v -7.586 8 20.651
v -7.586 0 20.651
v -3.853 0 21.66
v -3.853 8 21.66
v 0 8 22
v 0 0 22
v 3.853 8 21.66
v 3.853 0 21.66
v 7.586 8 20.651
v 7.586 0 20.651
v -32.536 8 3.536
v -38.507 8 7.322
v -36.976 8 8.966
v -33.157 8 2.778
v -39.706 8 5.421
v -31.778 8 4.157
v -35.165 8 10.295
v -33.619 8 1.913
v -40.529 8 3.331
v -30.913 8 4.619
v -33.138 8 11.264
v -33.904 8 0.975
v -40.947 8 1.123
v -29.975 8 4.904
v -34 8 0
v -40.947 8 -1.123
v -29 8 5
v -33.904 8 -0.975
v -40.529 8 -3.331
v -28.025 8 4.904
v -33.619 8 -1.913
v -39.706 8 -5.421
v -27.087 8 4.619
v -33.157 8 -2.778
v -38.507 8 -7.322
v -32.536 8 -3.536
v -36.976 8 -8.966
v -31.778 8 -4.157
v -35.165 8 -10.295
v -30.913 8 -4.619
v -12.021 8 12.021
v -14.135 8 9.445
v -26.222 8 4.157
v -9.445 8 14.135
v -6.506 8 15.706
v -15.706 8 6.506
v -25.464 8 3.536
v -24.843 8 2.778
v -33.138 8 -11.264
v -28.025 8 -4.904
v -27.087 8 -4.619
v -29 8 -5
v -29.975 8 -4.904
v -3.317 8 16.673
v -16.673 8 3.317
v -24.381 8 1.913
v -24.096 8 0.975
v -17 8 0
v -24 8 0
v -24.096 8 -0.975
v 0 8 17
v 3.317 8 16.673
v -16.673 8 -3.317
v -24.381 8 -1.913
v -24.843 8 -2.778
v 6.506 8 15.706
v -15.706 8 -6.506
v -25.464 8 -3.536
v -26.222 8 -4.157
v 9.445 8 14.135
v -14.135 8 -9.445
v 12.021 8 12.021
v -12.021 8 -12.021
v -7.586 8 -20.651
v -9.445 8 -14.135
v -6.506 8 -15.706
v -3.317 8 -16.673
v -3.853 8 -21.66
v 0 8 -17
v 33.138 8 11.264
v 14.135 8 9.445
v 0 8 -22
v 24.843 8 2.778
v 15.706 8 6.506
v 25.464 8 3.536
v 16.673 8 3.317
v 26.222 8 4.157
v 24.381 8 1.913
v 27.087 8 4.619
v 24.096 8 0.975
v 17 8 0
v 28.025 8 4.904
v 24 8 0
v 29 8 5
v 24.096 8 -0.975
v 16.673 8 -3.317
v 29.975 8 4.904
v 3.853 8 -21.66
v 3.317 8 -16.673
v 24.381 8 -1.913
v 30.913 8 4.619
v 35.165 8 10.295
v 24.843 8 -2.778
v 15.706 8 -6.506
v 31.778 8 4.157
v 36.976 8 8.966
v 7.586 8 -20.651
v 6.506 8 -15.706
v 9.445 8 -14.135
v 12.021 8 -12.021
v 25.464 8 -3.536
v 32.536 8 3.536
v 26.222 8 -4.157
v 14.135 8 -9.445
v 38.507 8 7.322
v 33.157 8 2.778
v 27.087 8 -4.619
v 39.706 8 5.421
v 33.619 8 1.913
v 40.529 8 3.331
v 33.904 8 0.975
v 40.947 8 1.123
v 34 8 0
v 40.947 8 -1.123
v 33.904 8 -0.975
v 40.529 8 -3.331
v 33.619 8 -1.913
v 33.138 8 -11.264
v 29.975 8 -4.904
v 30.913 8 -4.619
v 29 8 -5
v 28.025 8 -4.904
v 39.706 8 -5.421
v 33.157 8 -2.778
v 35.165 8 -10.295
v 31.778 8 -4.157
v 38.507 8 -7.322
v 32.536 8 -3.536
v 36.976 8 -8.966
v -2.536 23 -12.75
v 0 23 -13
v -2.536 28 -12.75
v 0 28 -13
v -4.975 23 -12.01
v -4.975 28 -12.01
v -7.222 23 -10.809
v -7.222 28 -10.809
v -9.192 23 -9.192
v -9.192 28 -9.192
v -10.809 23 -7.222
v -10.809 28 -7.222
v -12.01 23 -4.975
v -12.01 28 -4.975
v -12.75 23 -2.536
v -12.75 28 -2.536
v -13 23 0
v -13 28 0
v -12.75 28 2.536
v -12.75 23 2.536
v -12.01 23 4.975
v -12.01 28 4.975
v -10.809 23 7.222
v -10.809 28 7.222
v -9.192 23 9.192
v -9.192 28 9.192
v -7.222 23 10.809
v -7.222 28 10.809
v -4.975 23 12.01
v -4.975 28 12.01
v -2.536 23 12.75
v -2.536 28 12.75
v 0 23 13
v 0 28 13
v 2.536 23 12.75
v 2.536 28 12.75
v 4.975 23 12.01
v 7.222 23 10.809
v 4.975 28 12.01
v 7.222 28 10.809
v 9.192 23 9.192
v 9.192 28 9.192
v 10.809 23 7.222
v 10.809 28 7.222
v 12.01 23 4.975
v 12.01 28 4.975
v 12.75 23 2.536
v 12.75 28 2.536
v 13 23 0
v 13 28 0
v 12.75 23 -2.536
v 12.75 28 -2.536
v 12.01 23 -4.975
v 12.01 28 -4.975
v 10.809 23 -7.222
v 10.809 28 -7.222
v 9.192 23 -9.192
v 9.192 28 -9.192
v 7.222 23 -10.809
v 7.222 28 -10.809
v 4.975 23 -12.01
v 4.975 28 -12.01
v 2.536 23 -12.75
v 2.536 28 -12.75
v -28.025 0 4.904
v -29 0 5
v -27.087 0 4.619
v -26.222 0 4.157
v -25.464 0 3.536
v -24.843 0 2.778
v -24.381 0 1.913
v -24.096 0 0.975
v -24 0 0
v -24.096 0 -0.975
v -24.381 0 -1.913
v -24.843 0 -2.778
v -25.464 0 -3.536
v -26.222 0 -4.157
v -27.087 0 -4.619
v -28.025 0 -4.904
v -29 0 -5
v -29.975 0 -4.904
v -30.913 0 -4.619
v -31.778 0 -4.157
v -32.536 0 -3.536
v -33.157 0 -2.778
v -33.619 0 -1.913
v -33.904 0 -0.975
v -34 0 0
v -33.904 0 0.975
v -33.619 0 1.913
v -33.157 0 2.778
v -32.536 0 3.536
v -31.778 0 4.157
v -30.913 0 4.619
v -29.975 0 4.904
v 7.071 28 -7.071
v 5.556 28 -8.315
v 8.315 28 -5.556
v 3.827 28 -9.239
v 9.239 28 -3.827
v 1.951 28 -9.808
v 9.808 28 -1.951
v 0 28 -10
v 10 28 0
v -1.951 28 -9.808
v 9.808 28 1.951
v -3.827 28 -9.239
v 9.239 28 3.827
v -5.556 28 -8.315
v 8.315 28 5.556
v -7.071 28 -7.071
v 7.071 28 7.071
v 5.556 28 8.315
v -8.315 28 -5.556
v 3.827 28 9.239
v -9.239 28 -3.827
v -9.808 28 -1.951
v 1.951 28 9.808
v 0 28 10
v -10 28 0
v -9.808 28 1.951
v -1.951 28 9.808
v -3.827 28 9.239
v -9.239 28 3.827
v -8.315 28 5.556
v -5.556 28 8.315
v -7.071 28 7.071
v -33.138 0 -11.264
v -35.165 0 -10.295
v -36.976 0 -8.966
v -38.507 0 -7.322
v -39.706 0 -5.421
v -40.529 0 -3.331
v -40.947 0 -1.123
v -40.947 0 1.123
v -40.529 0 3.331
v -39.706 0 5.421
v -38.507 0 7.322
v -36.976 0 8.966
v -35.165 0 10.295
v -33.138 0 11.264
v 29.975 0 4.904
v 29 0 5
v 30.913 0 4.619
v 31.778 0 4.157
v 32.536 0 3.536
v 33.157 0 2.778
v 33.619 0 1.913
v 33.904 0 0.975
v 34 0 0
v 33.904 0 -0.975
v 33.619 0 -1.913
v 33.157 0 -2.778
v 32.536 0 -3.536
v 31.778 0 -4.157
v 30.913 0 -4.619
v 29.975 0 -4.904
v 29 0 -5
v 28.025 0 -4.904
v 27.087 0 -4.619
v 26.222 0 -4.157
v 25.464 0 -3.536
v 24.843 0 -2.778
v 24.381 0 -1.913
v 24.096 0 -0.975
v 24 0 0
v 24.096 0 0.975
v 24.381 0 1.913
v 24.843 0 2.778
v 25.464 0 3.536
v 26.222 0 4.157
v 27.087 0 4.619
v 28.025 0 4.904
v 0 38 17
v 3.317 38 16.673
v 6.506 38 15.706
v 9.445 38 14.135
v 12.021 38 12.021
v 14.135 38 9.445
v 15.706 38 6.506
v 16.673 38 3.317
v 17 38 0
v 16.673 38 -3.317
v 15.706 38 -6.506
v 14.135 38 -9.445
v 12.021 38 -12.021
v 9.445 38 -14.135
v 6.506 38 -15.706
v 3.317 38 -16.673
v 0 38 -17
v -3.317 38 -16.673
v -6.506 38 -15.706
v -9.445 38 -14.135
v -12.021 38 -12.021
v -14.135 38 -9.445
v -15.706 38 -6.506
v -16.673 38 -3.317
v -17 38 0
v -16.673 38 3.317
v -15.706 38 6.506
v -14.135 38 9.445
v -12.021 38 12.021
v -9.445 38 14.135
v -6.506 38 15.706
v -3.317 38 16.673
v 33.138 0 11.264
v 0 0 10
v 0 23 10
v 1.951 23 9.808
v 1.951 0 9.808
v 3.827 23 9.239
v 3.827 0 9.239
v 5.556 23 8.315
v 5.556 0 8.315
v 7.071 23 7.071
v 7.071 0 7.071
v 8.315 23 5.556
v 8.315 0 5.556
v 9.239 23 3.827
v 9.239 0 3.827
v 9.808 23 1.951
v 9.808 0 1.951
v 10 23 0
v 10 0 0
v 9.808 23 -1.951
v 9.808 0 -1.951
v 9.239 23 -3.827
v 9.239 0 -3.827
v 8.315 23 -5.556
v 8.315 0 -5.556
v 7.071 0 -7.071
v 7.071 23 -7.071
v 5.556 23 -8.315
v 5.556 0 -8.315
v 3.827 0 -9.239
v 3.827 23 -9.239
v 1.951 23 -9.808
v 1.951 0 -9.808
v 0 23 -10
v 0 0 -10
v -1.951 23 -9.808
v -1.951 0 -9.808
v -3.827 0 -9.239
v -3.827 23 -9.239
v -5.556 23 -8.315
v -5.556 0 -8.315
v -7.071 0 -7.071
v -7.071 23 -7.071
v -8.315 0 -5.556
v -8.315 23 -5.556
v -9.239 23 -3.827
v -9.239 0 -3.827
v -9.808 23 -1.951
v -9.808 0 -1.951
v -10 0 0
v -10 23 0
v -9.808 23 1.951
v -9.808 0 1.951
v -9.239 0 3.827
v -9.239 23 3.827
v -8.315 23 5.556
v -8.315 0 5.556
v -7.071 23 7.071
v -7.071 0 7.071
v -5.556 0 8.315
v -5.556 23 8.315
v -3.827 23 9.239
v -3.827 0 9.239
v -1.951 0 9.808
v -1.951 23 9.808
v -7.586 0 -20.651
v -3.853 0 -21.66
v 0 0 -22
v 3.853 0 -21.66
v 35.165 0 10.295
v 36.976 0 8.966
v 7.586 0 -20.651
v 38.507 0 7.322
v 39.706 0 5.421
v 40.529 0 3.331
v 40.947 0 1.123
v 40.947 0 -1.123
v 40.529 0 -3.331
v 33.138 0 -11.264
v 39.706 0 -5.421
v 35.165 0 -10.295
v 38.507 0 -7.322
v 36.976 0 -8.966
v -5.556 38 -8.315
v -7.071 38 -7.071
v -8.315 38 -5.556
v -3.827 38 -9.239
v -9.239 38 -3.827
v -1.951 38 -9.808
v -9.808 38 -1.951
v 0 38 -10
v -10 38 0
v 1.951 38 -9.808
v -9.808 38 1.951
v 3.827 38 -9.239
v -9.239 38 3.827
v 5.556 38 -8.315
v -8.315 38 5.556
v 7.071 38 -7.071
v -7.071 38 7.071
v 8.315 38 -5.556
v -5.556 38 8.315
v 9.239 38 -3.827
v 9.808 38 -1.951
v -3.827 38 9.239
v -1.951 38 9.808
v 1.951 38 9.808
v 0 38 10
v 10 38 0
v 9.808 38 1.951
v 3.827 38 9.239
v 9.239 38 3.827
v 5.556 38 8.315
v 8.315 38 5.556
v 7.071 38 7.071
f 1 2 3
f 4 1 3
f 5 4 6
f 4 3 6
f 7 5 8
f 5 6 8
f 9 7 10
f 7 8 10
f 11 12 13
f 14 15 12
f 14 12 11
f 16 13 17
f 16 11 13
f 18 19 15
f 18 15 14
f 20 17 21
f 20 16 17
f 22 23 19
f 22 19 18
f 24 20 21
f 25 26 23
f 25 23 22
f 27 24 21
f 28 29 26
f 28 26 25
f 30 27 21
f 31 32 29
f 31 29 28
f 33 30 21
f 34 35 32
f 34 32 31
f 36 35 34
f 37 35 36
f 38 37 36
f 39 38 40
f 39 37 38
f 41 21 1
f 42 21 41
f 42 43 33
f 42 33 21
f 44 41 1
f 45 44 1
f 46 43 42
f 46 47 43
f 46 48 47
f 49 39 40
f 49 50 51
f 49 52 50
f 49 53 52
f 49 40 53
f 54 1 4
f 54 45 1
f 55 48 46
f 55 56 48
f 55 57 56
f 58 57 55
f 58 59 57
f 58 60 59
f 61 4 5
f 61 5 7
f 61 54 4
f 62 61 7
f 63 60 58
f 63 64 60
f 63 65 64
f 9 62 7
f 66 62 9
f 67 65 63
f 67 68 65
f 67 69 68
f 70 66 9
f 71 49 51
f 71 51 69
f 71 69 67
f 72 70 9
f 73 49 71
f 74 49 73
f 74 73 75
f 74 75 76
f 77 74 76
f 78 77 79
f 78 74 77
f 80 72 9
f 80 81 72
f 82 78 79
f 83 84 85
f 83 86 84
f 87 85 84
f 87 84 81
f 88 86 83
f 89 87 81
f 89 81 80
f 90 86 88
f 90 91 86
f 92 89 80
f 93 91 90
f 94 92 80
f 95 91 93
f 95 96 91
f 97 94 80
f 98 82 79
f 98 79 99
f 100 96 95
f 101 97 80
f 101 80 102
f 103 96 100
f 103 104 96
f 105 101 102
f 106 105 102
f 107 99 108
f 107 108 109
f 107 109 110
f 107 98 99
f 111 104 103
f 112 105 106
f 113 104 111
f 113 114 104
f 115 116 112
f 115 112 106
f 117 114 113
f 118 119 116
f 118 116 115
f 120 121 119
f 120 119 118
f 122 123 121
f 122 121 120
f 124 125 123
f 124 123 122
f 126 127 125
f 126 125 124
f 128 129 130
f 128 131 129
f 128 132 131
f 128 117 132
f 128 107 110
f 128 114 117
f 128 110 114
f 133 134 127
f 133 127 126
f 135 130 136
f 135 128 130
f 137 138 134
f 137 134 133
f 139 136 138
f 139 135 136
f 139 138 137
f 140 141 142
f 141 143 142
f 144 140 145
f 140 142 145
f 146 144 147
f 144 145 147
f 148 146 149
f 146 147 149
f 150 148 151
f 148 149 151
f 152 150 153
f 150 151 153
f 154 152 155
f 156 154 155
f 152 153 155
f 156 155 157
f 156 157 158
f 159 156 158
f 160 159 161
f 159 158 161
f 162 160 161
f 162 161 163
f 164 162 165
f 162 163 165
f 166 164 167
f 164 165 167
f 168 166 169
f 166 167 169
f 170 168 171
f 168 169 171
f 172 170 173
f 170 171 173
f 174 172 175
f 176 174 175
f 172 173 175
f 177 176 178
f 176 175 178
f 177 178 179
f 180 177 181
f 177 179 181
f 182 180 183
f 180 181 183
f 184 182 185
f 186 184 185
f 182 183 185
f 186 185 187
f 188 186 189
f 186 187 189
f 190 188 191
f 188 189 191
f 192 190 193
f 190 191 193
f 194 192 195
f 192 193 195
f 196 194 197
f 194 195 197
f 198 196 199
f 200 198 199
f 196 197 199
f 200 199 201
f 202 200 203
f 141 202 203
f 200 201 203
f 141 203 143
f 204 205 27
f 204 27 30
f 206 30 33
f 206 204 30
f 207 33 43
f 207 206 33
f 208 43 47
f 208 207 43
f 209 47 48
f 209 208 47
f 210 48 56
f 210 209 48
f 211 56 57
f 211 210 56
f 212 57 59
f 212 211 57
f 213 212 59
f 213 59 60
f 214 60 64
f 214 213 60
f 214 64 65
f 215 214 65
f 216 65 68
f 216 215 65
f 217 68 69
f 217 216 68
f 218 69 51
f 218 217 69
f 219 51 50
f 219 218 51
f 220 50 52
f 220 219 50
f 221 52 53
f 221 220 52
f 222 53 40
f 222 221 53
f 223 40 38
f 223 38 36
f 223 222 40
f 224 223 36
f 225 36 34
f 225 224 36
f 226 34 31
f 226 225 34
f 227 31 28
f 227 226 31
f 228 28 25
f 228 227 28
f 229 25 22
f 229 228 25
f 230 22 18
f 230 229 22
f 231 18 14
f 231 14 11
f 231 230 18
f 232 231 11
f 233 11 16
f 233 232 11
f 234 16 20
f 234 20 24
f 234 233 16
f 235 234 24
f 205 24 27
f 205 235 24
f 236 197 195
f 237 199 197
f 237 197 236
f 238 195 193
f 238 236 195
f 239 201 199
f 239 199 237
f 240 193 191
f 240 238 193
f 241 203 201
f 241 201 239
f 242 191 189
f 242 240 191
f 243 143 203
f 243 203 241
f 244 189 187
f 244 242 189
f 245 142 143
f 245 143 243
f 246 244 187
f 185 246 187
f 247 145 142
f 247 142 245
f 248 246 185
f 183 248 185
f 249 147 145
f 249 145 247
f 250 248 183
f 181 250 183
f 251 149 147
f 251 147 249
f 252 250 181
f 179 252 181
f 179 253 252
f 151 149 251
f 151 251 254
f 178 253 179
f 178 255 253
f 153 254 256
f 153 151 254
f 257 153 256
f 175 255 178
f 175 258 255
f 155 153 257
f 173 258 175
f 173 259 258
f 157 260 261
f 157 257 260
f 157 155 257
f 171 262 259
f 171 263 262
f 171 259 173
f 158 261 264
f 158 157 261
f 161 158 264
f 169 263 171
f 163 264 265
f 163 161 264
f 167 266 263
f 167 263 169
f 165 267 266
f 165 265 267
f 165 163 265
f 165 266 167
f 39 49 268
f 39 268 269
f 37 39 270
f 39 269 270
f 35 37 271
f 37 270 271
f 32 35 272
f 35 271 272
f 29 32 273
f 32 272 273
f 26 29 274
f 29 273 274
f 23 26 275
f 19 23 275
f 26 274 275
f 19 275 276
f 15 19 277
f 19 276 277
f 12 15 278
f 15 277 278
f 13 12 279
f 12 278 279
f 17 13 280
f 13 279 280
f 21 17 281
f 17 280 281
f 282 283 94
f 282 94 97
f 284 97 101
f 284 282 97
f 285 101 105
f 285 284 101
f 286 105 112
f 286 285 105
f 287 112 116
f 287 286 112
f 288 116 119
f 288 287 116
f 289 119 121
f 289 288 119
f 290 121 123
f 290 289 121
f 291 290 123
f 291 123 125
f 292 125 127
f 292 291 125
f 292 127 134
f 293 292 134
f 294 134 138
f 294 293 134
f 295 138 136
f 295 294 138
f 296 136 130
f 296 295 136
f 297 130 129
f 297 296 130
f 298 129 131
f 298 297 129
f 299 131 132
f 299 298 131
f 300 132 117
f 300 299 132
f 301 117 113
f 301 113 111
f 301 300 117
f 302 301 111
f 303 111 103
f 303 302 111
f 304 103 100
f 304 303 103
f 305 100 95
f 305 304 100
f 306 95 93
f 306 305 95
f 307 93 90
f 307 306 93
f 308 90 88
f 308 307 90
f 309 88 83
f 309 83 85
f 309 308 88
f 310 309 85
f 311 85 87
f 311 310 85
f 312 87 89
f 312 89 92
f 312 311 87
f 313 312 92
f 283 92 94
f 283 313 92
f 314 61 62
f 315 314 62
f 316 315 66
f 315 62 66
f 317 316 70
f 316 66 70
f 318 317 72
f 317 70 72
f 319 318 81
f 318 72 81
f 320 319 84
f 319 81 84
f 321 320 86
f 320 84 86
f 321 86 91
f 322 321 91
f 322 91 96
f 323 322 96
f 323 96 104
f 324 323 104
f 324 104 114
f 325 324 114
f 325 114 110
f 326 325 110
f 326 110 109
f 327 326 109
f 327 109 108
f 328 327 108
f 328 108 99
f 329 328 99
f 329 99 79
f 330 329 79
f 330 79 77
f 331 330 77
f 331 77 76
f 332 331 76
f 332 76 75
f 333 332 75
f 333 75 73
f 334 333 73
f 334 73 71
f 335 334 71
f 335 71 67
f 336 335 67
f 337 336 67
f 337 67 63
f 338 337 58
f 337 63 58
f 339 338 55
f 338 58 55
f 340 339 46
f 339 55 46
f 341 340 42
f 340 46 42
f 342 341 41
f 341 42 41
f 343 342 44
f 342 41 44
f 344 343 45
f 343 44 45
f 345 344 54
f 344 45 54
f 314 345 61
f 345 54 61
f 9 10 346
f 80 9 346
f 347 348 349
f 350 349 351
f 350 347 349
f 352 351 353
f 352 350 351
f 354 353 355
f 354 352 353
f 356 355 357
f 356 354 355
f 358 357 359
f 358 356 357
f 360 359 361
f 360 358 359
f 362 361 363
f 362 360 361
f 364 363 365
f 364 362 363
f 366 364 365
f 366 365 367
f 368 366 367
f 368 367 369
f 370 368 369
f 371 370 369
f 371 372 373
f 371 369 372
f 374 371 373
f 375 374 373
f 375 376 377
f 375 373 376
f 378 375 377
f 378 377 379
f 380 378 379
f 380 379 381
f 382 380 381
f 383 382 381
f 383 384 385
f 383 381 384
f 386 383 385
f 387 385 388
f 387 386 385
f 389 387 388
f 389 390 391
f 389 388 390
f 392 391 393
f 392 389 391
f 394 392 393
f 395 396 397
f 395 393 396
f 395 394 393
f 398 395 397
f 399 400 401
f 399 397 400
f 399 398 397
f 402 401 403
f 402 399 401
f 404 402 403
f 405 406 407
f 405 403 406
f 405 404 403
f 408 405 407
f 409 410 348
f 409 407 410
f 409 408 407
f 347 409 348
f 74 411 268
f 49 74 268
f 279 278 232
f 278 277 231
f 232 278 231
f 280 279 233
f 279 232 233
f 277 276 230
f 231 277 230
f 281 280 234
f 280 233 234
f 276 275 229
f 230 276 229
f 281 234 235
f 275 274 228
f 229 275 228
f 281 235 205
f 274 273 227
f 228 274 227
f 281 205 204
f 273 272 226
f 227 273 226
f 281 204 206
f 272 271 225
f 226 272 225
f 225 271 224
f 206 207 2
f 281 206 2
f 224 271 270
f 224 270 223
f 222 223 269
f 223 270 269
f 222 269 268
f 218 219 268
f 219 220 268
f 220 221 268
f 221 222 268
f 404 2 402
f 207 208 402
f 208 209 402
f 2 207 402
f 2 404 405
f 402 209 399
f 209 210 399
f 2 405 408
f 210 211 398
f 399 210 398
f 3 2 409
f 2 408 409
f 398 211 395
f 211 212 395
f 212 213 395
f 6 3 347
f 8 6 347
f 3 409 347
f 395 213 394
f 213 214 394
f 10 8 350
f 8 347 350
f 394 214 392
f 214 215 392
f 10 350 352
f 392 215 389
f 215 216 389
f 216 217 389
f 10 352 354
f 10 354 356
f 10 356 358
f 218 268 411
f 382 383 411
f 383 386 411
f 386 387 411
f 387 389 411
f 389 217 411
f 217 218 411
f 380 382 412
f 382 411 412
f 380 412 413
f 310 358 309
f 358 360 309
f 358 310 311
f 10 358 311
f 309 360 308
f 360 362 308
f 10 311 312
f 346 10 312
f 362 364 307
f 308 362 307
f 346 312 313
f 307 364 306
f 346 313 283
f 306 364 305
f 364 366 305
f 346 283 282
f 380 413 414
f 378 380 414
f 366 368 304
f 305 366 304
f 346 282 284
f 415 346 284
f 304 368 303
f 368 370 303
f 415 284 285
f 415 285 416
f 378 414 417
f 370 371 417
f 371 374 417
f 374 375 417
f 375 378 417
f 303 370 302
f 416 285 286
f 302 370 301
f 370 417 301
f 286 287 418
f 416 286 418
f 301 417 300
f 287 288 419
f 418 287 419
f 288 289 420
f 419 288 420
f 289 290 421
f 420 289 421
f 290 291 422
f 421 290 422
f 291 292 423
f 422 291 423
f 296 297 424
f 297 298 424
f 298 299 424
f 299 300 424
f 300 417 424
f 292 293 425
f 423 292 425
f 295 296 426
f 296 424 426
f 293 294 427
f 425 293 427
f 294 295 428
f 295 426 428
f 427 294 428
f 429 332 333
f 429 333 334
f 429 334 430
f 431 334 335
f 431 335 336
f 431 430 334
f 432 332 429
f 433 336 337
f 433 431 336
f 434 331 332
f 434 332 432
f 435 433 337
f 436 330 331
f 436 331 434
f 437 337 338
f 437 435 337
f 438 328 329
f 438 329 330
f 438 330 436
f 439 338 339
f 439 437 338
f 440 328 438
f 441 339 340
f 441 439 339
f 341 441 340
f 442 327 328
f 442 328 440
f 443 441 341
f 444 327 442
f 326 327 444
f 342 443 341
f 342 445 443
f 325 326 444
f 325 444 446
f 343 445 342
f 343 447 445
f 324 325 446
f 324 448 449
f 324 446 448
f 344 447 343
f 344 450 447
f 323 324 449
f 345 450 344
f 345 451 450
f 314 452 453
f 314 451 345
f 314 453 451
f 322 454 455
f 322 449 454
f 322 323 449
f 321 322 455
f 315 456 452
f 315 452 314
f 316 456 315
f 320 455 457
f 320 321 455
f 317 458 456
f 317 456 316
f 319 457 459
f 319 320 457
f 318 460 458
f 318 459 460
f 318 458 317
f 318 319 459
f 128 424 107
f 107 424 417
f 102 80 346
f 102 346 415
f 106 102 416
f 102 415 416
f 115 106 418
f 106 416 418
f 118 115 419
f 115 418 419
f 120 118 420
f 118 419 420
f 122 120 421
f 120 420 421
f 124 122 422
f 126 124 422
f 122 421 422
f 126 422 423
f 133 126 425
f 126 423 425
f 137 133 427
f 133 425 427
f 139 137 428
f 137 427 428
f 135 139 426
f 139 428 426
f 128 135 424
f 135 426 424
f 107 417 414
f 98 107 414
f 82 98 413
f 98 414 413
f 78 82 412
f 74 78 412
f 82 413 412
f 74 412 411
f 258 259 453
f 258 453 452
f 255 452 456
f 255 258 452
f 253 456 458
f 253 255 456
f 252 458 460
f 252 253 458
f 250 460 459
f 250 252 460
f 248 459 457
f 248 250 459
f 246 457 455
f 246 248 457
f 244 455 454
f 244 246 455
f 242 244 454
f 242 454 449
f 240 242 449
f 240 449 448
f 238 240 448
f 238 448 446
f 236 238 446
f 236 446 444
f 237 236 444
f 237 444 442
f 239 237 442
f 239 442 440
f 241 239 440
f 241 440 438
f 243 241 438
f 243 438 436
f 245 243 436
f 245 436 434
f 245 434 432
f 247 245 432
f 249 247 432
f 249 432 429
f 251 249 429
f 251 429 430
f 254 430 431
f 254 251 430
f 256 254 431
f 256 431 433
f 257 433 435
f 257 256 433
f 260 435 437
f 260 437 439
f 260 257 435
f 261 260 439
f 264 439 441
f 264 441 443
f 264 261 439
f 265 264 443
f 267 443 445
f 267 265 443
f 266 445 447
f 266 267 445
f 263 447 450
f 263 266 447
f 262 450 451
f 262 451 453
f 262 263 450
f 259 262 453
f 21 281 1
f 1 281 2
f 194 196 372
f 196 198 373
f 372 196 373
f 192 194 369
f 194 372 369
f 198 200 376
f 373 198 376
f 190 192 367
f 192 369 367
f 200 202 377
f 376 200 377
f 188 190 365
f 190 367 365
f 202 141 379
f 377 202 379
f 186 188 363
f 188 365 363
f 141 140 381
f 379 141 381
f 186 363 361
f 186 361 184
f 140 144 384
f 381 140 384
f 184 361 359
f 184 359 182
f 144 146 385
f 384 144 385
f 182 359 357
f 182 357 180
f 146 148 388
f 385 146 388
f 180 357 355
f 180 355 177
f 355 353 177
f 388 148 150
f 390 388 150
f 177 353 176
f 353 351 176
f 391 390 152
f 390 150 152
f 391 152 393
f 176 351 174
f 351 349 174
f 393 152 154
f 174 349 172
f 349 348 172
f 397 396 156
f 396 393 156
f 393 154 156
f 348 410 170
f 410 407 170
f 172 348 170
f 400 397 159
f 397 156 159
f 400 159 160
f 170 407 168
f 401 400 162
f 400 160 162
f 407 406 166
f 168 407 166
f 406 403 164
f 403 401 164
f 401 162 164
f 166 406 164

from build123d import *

# Parameters (mm, degrees)
SKETCH_1_R      = 5
SKETCH_1_R_2    = 22
SKETCH_1_R_3    = 17
SKETCH_1_R_4    = 10
EXTRUDE_1_DEPTH = 8
SKETCH_1_3_R    = 17
SKETCH_1_3_R_2  = 10
EXTRUDE_2_DEPTH = 38
SKETCH_2_W      = 13
SKETCH_2_H      = 5


with BuildPart() as part:
    # 草圖1 → 伸長1 (new body)
    # profile 1 of 4: a face of its own
    with BuildSketch(Plane(origin=(0, 0, 0), x_dir=(1, 0, 0), z_dir=(0, 1, 0))):
        with BuildLine():
            Line((33.137931034, 11.263992487), (7.586206897, 20.650652893))
            ThreePointArc((7.586206897, 20.650652893), (18.040185028, 12.591732372), (22, 0))
            ThreePointArc((22, 0), (18.040185028, -12.591732372), (7.586206897, -20.650652893))
            Line((7.586206897, -20.650652893), (33.137931034, -11.263992487))
            ThreePointArc((33.137931034, -11.263992487), (41, 0), (33.137931034, 11.263992487))
        make_face()
        with Locations(Location((29, 0, 0), (0, 0, 270))):
            Circle(SKETCH_1_R, mode=Mode.SUBTRACT)
    # profile 2 of 4: a face of its own
    with BuildSketch(Plane(origin=(0, 0, 0), x_dir=(1, 0, 0), z_dir=(0, 1, 0))):
        Circle(SKETCH_1_R_2)
        Circle(SKETCH_1_R_3, mode=Mode.SUBTRACT)
    # profile 3 of 4: a face of its own
    with BuildSketch(Plane(origin=(0, 0, 0), x_dir=(1, 0, 0), z_dir=(0, 1, 0))):
        Circle(SKETCH_1_R_3)
        with Locations(Location((0, 0, 0), (0, 0, 270))):
            Circle(SKETCH_1_R_4, mode=Mode.SUBTRACT)
    # profile 4 of 4: a face of its own
    with BuildSketch(Plane(origin=(0, 0, 0), x_dir=(1, 0, 0), z_dir=(0, 1, 0))):
        with BuildLine():
            ThreePointArc((-7.586206897, -20.650652893), (-22, 0), (-7.586206897, 20.650652893))
            Line((-7.586206897, 20.650652893), (-33.137931034, 11.263992487))
            ThreePointArc((-33.137931034, 11.263992487), (-41, 0), (-33.137931034, -11.263992487))
            Line((-33.137931034, -11.263992487), (-7.586206897, -20.650652893))
        make_face()
        with Locations(Location((-29, 0, 0), (0, 0, 270))):
            Circle(SKETCH_1_R, mode=Mode.SUBTRACT)
    extrude(amount=EXTRUDE_1_DEPTH)

    # 草圖1<3> → 伸長2 (add)
    with BuildSketch(Plane(origin=(0, 0, 0), x_dir=(1, 0, 0), z_dir=(0, 1, 0))):
        with Locations(Location((0, 0, 0), (0, 0, 270))):
            Circle(SKETCH_1_3_R)
        with Locations(Location((0, 0, 0), (0, 0, 270))):
            Circle(SKETCH_1_3_R_2, mode=Mode.SUBTRACT)
    extrude(amount=EXTRUDE_2_DEPTH)

    # 草圖2 → 除料-旋轉1 (revolve, cut)
    with BuildSketch(Plane.XY, mode=Mode.PRIVATE) as cut_revolve_1_sk:
        with Locations((6.5, 25.5)):
            Rectangle(SKETCH_2_W, SKETCH_2_H)
    revolve(cut_revolve_1_sk.sketch.rotate(Axis((0, 0, 0), (0, 1, 0)), 90), axis=Axis((0, 0, 0), (0, 1, 0)), mode=Mode.SUBTRACT)


solid = part.part
